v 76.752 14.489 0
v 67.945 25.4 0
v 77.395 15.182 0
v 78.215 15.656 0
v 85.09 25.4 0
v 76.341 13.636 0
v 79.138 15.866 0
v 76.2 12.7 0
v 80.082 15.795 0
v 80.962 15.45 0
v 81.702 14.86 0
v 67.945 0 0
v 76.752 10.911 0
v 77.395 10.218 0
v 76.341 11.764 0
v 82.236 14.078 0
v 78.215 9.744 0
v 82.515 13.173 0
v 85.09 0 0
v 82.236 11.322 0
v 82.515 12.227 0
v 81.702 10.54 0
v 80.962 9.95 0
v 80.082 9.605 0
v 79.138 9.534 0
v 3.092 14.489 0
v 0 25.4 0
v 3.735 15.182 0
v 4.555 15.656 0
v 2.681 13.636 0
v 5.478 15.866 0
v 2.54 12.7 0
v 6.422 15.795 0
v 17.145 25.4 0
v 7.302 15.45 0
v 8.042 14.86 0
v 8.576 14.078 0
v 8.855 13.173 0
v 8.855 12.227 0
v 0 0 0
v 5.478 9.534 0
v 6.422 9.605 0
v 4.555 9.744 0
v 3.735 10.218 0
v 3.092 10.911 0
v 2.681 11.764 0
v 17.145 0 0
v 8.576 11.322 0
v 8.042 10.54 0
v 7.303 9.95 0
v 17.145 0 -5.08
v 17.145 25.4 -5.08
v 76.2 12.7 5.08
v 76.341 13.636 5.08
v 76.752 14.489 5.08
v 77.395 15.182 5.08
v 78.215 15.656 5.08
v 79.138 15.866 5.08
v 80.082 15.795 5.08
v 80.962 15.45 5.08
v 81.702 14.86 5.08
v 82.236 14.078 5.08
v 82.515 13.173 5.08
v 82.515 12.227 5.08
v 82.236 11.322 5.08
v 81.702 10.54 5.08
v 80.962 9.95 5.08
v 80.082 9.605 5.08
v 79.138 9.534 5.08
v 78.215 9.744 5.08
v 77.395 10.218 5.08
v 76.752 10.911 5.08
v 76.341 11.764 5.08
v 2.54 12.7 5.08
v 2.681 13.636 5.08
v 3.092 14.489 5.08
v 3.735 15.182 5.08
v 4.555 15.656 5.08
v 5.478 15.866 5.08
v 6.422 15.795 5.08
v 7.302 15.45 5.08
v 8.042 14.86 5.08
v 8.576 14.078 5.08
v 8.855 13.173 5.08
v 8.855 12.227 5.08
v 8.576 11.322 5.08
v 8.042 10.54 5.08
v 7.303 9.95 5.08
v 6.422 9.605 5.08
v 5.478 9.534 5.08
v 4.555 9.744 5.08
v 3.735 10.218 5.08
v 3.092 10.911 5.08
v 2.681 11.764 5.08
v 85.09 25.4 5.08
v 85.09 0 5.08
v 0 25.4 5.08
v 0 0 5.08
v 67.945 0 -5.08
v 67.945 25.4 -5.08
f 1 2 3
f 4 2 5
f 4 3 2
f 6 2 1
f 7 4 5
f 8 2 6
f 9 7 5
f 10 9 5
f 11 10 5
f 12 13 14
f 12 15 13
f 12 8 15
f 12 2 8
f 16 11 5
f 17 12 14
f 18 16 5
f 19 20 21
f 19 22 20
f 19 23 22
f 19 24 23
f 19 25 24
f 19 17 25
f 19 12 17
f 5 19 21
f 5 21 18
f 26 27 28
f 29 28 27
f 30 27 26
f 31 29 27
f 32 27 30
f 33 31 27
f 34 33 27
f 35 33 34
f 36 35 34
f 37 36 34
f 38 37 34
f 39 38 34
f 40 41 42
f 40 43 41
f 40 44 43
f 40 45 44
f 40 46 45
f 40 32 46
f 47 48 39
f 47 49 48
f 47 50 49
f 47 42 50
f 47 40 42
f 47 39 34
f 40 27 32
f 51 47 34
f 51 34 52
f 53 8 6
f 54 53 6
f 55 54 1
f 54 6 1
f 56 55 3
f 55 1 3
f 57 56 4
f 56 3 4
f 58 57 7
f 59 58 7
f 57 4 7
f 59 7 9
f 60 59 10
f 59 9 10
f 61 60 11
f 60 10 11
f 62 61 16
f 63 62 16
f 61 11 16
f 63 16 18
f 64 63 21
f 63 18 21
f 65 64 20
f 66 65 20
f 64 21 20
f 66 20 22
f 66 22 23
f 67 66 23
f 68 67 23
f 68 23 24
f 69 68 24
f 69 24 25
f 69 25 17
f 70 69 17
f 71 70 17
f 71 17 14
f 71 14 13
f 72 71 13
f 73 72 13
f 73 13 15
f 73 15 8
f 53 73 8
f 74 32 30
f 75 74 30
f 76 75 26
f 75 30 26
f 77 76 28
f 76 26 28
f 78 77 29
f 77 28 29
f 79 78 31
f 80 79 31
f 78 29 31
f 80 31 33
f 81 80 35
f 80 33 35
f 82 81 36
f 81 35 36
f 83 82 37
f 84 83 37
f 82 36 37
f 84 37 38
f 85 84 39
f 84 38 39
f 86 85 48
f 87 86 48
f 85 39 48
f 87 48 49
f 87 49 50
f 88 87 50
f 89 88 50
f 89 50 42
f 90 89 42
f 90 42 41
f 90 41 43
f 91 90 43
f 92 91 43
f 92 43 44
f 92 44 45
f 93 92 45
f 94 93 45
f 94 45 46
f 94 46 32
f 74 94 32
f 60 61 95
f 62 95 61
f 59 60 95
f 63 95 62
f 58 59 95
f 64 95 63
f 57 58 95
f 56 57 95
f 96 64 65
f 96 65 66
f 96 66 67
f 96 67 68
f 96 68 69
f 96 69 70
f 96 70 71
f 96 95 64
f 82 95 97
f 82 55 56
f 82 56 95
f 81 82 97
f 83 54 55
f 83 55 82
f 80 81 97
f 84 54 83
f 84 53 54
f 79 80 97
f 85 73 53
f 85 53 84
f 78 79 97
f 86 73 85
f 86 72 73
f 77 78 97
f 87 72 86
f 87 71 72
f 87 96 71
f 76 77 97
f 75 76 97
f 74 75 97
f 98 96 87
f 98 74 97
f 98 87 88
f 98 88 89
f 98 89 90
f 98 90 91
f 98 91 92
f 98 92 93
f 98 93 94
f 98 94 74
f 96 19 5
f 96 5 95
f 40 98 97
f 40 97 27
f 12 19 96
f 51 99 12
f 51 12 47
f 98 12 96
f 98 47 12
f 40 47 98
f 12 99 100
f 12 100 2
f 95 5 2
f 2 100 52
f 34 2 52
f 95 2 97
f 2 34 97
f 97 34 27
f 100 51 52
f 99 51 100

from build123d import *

# Parameters (mm, degrees)
BOSS_EXTRUDE1_DEPTH         = 25.4
F_1_4_0_25_DIAMETER_HOLE1_D = 6.35


with BuildPart() as part:
    # Sketch1 → Boss-Extrude1 (new body)
    with BuildSketch(Plane(origin=(0, 0, 0), x_dir=(1, 0, 0), z_dir=(0, 1, 0))):
        Polygon((67.945, 0), (85.09, 0), (85.09, -5.08), (0, -5.08), (0, 0), (17.145, 0), (17.145, 5.08), (67.945, 5.08), align=None)
    extrude(amount=BOSS_EXTRUDE1_DEPTH)

    # 1/4 (0.25) Diameter Hole1 (through all)
    with Locations(Plane.XY.offset(5.08)):
        with Locations((5.715, 12.7), (79.375, 12.7)):
            Hole(F_1_4_0_25_DIAMETER_HOLE1_D / 2)


solid = part.part
